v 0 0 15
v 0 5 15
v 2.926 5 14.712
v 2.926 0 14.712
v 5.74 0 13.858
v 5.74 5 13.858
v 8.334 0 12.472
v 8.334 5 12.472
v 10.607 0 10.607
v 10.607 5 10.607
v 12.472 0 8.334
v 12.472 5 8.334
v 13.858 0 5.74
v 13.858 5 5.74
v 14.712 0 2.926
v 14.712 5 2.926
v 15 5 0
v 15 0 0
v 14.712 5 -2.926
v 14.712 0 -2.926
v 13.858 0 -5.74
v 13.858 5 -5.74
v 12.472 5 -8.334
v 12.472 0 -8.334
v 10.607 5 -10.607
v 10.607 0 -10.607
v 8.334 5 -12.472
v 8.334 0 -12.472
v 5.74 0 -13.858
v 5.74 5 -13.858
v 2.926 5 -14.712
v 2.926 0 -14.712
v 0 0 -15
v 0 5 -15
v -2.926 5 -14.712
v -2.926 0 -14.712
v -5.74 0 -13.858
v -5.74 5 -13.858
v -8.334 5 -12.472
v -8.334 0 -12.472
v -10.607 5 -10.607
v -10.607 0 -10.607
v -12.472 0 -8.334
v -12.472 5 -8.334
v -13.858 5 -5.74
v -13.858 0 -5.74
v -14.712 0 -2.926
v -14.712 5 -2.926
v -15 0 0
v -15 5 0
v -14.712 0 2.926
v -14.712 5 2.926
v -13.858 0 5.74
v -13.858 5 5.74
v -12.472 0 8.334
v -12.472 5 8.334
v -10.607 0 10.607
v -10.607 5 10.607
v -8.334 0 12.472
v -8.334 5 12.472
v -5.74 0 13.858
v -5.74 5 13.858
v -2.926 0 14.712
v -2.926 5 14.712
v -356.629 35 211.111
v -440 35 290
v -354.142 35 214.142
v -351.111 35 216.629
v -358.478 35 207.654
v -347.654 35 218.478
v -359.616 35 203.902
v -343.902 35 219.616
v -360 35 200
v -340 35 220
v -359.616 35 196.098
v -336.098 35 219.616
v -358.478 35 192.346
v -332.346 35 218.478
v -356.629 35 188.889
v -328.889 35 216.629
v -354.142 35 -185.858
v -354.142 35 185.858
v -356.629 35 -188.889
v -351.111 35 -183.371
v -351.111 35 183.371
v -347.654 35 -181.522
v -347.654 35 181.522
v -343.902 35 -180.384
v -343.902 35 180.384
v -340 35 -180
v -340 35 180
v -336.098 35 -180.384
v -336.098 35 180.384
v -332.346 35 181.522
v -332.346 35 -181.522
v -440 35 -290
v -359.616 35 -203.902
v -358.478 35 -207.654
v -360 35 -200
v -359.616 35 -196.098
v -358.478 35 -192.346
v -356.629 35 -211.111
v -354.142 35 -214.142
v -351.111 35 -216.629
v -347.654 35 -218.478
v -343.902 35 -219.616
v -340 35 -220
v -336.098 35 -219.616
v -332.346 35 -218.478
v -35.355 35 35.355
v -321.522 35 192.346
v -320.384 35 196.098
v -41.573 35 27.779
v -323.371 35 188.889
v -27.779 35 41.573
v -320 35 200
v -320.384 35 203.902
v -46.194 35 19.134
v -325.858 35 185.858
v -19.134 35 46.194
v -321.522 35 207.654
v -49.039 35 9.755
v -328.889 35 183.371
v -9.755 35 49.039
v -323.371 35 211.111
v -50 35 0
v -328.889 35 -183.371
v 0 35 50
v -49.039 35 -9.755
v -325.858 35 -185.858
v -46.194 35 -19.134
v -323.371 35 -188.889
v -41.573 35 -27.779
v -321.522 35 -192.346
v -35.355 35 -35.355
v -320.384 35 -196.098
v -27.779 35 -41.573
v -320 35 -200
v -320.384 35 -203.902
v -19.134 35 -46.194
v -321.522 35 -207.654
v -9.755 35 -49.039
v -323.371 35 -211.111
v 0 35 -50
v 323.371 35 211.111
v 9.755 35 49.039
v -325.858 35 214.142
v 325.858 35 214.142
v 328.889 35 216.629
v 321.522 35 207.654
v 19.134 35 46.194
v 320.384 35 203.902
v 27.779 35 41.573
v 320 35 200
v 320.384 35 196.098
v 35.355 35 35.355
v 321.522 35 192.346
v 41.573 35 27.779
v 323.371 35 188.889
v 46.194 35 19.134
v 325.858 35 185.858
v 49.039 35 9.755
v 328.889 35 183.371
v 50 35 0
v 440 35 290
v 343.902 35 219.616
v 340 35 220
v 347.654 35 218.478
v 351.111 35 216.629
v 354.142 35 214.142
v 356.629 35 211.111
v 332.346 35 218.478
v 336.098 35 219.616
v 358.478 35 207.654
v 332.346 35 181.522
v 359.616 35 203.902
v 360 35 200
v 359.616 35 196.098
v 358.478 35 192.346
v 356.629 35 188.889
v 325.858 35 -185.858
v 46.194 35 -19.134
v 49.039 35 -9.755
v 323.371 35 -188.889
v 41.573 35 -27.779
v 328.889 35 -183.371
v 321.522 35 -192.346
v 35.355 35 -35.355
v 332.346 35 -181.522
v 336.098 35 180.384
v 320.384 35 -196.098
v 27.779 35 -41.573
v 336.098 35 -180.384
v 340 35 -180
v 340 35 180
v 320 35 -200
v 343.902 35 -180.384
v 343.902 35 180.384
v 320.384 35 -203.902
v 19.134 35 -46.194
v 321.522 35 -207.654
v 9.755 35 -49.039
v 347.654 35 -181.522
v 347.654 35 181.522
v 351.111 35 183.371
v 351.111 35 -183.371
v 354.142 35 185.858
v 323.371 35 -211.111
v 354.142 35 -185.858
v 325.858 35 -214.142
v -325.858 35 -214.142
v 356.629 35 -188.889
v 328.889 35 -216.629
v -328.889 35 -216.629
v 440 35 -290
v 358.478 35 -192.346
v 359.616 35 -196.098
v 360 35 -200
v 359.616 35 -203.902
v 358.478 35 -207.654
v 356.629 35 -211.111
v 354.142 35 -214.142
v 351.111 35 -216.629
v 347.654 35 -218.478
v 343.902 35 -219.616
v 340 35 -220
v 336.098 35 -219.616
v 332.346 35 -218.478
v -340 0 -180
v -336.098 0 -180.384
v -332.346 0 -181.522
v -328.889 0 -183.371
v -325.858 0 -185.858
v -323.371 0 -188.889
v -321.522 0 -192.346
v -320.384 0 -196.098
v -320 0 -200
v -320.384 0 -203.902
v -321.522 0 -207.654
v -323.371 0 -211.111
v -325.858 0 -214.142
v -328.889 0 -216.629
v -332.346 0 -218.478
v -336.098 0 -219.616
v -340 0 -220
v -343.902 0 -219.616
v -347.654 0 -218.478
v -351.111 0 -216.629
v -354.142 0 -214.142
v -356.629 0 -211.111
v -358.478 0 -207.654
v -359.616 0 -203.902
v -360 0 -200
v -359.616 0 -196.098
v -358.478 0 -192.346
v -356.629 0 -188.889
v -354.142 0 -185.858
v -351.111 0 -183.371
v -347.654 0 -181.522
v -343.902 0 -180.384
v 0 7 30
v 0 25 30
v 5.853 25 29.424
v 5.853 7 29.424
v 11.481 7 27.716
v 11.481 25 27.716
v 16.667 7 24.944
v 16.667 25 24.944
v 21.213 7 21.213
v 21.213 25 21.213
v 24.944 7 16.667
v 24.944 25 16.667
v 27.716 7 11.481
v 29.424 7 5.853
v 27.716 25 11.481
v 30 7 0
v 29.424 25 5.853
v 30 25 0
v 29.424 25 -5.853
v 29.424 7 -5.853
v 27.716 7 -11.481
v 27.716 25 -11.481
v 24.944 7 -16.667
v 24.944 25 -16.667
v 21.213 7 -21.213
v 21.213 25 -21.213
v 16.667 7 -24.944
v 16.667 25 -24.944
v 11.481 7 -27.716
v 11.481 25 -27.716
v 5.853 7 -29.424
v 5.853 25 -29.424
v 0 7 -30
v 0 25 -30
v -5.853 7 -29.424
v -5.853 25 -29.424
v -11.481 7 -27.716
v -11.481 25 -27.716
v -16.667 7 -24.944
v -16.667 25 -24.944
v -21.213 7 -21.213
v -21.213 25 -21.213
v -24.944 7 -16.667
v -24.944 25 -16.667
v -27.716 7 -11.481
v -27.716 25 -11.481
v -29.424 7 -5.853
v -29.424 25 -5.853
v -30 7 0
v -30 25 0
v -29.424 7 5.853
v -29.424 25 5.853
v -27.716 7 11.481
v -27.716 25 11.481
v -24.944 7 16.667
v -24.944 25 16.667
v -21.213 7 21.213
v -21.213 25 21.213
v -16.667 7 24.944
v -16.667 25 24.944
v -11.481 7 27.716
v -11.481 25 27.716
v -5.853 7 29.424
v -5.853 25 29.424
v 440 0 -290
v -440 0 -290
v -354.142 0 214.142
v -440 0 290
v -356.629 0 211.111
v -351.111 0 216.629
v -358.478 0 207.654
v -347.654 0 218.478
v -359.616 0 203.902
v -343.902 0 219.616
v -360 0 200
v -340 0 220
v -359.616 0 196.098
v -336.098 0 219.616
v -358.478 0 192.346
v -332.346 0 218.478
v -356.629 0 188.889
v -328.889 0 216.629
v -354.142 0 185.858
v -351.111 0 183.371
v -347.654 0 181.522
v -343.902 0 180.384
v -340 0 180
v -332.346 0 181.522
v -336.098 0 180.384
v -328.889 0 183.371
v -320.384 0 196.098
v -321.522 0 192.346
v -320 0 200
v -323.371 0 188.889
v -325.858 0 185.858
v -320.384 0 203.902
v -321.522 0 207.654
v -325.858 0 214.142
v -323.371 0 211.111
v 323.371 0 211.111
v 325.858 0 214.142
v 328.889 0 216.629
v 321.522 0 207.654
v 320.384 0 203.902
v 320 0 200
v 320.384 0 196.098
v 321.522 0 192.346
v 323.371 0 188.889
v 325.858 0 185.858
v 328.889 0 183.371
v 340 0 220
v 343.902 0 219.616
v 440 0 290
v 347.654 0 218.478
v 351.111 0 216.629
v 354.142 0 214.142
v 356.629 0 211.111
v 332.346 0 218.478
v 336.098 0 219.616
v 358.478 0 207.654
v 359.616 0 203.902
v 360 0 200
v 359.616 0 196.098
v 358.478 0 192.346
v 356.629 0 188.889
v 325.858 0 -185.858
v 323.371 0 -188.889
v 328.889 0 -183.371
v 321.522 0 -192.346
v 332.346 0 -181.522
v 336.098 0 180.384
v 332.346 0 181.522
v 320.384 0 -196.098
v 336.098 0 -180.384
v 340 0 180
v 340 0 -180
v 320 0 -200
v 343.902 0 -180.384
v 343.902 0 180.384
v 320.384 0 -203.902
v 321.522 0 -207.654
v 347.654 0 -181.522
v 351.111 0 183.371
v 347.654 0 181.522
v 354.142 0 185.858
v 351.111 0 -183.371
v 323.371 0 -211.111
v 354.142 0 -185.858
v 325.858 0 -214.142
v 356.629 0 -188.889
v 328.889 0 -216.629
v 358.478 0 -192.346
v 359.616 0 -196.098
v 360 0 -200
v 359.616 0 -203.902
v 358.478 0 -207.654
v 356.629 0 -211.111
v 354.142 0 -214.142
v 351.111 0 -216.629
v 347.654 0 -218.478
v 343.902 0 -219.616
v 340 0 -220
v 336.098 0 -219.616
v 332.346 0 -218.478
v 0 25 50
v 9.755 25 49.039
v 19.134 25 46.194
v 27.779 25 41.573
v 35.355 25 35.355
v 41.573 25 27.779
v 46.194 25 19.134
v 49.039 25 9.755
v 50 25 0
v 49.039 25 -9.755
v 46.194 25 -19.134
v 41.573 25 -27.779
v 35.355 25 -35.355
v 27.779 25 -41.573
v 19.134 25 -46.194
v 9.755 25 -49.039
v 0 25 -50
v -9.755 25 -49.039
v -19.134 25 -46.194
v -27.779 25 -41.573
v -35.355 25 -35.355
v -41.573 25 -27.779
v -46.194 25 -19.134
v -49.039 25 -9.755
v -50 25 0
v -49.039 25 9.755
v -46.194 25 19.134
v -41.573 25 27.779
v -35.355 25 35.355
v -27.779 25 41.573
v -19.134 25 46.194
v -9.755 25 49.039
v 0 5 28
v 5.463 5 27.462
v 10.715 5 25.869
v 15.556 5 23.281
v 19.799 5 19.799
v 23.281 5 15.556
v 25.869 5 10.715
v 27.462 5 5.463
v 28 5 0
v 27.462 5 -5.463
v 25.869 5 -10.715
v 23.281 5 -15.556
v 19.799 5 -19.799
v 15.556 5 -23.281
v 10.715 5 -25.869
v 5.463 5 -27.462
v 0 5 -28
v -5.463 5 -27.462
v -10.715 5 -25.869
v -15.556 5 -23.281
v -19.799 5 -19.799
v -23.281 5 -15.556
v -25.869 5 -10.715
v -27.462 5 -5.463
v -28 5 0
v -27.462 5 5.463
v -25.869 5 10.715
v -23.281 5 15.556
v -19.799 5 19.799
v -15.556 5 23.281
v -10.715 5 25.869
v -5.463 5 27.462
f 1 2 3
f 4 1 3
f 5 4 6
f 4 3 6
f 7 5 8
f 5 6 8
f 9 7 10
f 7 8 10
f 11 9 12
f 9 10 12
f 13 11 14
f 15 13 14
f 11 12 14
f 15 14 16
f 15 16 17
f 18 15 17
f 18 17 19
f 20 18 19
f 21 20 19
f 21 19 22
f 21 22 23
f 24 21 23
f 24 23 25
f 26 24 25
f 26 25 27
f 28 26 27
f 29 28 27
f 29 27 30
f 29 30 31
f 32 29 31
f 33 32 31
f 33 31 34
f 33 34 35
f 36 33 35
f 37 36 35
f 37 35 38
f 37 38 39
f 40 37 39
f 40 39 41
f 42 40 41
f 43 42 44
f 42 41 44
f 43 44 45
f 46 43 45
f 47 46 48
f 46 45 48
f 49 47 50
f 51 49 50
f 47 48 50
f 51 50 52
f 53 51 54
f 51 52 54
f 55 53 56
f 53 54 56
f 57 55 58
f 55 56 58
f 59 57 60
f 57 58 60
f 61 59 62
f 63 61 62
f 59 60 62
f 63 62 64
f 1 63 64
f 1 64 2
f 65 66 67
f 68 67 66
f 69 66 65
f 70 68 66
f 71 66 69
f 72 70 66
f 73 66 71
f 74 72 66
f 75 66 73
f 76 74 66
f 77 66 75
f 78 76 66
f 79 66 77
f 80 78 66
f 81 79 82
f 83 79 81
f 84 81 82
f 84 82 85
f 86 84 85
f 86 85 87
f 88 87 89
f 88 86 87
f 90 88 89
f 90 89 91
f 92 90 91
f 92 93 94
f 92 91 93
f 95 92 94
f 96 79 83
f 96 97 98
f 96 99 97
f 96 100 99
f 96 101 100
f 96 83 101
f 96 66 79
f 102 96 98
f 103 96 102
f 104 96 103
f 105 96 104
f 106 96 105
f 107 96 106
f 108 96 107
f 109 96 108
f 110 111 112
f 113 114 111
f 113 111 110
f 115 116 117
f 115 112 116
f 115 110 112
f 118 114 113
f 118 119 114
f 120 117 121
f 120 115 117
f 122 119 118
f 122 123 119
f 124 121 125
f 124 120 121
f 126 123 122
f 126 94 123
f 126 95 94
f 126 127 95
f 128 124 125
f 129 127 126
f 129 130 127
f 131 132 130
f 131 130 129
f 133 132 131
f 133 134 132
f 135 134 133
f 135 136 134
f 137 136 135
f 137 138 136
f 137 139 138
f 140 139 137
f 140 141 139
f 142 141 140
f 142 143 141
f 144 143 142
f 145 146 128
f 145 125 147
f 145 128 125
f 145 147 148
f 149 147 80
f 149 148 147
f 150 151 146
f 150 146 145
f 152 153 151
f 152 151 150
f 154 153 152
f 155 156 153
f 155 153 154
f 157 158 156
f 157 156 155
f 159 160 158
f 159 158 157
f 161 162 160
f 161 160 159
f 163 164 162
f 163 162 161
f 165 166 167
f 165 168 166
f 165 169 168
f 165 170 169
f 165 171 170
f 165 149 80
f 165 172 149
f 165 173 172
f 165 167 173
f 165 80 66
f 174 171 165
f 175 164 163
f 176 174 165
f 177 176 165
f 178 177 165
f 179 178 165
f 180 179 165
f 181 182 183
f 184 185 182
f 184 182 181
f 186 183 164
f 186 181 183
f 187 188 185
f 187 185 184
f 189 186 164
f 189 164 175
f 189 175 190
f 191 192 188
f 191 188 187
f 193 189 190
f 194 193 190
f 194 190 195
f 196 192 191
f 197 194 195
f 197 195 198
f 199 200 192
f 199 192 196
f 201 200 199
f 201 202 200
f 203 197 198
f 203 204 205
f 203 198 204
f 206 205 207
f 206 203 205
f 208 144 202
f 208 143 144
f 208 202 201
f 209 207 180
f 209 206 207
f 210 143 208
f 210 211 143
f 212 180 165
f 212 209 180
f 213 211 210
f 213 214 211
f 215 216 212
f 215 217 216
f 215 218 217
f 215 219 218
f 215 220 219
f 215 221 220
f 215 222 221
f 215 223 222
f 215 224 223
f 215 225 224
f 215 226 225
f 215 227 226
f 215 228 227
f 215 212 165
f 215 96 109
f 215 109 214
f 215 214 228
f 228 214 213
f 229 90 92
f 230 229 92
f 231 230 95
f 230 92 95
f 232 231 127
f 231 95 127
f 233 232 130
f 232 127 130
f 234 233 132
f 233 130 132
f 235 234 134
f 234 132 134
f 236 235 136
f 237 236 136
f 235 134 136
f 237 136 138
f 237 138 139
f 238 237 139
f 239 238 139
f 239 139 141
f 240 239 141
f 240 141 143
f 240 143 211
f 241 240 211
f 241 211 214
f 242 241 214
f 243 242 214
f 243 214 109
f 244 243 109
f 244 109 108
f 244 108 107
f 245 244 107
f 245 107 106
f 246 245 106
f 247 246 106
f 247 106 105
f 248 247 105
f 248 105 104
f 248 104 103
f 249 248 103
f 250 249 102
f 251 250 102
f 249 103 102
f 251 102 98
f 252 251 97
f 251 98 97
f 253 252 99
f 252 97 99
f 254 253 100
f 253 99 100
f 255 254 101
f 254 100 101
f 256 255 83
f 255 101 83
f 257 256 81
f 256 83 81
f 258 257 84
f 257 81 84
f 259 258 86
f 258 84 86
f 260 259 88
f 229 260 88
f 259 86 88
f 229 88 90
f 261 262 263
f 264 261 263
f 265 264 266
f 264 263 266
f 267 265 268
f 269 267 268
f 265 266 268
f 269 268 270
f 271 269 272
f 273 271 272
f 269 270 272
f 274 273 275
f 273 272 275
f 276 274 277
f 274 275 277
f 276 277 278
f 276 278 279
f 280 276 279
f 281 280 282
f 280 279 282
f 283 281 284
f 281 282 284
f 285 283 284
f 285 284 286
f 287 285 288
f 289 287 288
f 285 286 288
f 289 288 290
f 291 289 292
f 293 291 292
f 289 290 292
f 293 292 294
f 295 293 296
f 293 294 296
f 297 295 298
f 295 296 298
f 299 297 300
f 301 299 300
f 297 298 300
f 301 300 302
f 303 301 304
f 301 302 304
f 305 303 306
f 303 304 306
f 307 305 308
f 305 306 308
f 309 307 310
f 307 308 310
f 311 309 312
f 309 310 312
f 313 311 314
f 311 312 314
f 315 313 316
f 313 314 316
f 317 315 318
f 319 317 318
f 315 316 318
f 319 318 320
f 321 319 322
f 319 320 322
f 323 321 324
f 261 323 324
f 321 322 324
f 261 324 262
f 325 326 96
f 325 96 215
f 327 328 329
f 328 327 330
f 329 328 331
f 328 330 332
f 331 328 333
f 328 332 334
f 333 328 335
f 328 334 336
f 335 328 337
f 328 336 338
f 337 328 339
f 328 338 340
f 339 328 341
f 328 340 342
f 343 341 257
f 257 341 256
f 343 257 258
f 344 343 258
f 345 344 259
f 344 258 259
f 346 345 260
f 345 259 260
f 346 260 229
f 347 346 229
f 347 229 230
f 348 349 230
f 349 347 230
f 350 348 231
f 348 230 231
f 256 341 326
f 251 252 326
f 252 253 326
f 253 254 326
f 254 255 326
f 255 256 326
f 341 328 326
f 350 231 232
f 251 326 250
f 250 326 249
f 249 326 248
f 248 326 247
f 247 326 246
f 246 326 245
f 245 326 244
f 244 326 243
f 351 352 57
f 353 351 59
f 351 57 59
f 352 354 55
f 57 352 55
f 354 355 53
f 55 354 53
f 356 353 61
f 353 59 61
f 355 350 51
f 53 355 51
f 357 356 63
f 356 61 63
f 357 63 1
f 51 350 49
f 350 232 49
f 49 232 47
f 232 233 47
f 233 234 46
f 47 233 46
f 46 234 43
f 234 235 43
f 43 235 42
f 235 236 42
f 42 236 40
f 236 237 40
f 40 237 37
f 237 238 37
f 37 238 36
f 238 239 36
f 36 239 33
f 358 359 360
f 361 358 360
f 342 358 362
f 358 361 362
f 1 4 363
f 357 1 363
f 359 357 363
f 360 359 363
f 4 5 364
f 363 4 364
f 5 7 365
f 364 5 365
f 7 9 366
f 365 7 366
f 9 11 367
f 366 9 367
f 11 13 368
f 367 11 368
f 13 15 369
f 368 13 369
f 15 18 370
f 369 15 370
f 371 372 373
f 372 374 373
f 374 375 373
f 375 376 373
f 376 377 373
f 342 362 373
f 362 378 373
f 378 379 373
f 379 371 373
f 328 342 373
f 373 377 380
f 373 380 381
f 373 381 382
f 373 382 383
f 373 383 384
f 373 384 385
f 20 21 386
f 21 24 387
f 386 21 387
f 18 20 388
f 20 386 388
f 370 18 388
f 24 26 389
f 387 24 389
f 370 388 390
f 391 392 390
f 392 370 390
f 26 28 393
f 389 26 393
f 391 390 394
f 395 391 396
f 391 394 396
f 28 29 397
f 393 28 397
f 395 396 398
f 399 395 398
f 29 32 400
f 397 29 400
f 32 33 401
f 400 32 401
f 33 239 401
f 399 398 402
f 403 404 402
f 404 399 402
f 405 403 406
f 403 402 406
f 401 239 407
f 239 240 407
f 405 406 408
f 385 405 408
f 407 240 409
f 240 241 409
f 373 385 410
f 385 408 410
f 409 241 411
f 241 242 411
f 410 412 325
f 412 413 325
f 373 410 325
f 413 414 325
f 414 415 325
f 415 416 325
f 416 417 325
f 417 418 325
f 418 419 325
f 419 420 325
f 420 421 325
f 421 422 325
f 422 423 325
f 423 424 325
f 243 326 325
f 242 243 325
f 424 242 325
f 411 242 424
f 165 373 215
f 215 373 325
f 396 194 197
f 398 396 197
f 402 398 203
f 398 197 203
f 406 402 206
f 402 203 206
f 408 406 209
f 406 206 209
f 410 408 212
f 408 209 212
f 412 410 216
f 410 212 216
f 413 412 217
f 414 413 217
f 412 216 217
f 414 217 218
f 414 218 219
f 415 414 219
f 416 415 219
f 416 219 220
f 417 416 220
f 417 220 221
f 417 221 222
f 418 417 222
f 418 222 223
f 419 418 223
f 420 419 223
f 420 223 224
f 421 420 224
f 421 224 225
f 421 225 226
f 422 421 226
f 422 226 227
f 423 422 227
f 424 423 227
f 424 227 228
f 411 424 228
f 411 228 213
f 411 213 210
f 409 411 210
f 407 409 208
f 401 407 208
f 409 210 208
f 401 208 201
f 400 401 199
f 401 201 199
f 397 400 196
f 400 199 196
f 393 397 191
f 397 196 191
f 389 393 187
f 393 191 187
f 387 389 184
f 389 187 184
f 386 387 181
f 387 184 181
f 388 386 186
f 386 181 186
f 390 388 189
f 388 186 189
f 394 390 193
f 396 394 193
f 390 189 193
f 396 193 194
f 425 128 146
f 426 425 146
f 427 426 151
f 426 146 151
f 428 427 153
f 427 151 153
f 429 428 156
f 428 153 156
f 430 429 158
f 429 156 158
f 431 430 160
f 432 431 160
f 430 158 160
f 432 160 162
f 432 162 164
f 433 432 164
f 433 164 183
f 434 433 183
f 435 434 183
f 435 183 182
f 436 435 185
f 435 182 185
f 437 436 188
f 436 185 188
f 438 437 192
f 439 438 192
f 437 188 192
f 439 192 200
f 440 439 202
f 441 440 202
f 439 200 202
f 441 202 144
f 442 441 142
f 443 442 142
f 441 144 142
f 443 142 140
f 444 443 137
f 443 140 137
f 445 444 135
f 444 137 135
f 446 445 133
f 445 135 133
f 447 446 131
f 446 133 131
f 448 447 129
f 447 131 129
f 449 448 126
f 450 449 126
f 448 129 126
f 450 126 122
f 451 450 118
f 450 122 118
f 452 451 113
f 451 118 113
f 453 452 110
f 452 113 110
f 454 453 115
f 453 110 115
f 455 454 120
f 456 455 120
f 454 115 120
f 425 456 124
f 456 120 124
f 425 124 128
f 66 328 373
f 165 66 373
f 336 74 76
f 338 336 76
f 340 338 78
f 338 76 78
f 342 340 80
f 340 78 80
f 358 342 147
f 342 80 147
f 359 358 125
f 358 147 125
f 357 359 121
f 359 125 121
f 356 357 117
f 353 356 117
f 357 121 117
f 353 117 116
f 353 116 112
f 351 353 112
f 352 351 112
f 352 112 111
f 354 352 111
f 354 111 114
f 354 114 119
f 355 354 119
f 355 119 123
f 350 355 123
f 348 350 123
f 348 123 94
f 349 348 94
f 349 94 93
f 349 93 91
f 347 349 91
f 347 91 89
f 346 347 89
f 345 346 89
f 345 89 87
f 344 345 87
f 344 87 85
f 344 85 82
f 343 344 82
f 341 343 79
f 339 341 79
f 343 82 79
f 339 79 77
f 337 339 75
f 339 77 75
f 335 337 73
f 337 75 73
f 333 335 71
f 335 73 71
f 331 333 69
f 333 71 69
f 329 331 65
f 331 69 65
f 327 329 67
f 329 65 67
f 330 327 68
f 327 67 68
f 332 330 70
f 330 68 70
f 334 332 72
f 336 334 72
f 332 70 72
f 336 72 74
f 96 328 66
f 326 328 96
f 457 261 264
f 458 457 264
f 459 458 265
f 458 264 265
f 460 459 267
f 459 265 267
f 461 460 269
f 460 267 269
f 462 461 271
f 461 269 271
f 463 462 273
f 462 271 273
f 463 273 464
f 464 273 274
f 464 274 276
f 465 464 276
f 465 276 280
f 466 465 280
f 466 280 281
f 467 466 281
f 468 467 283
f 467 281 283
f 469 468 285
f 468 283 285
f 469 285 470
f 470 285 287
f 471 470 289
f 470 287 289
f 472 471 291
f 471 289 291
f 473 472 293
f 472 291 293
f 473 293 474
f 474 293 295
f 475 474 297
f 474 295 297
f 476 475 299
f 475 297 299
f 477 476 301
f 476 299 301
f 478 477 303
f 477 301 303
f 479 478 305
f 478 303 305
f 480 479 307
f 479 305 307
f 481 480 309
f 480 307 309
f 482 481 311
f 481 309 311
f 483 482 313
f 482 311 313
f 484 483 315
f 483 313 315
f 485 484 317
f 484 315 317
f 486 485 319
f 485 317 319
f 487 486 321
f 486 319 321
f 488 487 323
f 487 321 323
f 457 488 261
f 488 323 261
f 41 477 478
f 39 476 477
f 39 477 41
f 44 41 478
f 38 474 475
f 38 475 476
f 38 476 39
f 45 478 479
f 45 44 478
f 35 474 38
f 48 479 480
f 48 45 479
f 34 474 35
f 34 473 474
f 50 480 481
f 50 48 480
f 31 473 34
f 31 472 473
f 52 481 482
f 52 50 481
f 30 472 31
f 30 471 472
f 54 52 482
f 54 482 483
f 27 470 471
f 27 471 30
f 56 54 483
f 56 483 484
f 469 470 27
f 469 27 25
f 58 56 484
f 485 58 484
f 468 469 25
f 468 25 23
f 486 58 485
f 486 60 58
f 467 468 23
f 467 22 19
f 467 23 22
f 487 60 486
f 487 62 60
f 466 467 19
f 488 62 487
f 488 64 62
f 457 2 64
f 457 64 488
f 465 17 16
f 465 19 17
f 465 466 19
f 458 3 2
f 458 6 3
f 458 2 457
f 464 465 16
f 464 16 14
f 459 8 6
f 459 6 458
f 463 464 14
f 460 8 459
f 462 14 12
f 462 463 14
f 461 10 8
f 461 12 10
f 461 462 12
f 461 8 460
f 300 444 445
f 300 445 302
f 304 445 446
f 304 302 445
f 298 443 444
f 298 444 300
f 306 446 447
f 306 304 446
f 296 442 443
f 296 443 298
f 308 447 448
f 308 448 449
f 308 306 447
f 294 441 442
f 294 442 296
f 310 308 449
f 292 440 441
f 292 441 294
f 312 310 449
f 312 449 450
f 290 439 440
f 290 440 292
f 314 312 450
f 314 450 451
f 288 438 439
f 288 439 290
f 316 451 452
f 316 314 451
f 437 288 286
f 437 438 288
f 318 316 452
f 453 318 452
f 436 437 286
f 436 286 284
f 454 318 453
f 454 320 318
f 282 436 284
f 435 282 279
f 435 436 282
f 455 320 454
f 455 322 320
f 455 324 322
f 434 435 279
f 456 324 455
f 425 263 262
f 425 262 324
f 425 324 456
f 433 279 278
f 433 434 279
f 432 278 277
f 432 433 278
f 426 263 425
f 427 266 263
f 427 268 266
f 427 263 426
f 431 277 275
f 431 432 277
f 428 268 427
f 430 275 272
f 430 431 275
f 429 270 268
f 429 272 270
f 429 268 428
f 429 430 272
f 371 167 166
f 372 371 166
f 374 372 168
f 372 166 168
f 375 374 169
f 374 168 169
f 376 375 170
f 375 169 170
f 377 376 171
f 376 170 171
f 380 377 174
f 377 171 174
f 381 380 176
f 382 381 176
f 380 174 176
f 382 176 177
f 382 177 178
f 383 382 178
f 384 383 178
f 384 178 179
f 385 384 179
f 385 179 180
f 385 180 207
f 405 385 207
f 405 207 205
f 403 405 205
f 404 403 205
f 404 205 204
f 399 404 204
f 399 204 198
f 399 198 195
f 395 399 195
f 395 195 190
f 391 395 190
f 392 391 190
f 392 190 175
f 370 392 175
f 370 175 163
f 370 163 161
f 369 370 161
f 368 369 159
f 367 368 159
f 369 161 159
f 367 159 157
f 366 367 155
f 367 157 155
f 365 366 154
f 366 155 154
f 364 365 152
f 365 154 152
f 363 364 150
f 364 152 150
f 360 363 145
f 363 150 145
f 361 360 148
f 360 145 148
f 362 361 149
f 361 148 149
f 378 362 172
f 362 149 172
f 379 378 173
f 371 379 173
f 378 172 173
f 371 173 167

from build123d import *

# Parameters (mm, degrees)
SKETCH1_W           = 880
SKETCH1_H           = 580
BOSS_EXTRUDE1_DEPTH = 35
SKETCH2_R           = 50
CUT_EXTRUDE1_DEPTH  = 10
SKETCH3_R           = 30
CUT_EXTRUDE2_DEPTH  = 20
SKETCH4_R           = 15
CUT_EXTRUDE3_DEPTH  = 522
CHAMFER1_SIZE       = 2
SKETCH5_R           = 20
CUT_EXTRUDE4_DEPTH  = 450


with BuildPart() as part:
    # Sketch1 → Boss-Extrude1 (new body)
    with BuildSketch(Plane(origin=(0, 0, 0), x_dir=(1, 0, 0), z_dir=(0, 1, 0))):
        Rectangle(SKETCH1_W, SKETCH1_H)
    extrude(amount=BOSS_EXTRUDE1_DEPTH)

    # Sketch2 → Cut-Extrude1 (cut)
    with BuildSketch(Plane(origin=(0, 35, 0), x_dir=(1, 0, 0), z_dir=(0, 1, 0))):
        with Locations(Location((0, 0, 0), (0, 0, 270))):
            Circle(SKETCH2_R)
    extrude(amount=-CUT_EXTRUDE1_DEPTH, mode=Mode.SUBTRACT)

    # Sketch3 → Cut-Extrude2 (cut)
    with BuildSketch(Plane(origin=(0, 25, 0), x_dir=(1, 0, 0), z_dir=(0, 1, 0))):
        with Locations(Location((0, 0, 0), (0, 0, 270))):
            Circle(SKETCH3_R)
    extrude(amount=-CUT_EXTRUDE2_DEPTH, mode=Mode.SUBTRACT)

    # Sketch4 → Cut-Extrude3 (cut)
    with BuildSketch(Plane(origin=(0, 5, 0), x_dir=(1, 0, 0), z_dir=(0, 1, 0))):
        with Locations(Location((0, 0, 0), (0, 0, 270))):
            Circle(SKETCH4_R)
    extrude(amount=-CUT_EXTRUDE3_DEPTH, mode=Mode.SUBTRACT)

    # Chamfer1
    chamfer1_edges = [part.edges().sort_by_distance(p)[0] for p in [
        (0, 5, -30),
    ]]
    chamfer(chamfer1_edges, length=CHAMFER1_SIZE)

    # Sketch5 → Cut-Extrude4 (cut)
    with BuildSketch(Plane(origin=(0, 35, 0), x_dir=(1, 0, 0), z_dir=(0, 1, 0))):
        with Locations(Location((-340, 200, 0), (0, 0, 270))):
            Circle(SKETCH5_R)
        with Locations(Location((340, 200, 0), (0, 0, 270))):
            Circle(SKETCH5_R)
        with Locations(Location((340, -200, 0), (0, 0, 270))):
            Circle(SKETCH5_R)
        with Locations(Location((-340, -200, 0), (0, 0, 270))):
            Circle(SKETCH5_R)
    extrude(amount=-CUT_EXTRUDE4_DEPTH, mode=Mode.SUBTRACT)


solid = part.part
